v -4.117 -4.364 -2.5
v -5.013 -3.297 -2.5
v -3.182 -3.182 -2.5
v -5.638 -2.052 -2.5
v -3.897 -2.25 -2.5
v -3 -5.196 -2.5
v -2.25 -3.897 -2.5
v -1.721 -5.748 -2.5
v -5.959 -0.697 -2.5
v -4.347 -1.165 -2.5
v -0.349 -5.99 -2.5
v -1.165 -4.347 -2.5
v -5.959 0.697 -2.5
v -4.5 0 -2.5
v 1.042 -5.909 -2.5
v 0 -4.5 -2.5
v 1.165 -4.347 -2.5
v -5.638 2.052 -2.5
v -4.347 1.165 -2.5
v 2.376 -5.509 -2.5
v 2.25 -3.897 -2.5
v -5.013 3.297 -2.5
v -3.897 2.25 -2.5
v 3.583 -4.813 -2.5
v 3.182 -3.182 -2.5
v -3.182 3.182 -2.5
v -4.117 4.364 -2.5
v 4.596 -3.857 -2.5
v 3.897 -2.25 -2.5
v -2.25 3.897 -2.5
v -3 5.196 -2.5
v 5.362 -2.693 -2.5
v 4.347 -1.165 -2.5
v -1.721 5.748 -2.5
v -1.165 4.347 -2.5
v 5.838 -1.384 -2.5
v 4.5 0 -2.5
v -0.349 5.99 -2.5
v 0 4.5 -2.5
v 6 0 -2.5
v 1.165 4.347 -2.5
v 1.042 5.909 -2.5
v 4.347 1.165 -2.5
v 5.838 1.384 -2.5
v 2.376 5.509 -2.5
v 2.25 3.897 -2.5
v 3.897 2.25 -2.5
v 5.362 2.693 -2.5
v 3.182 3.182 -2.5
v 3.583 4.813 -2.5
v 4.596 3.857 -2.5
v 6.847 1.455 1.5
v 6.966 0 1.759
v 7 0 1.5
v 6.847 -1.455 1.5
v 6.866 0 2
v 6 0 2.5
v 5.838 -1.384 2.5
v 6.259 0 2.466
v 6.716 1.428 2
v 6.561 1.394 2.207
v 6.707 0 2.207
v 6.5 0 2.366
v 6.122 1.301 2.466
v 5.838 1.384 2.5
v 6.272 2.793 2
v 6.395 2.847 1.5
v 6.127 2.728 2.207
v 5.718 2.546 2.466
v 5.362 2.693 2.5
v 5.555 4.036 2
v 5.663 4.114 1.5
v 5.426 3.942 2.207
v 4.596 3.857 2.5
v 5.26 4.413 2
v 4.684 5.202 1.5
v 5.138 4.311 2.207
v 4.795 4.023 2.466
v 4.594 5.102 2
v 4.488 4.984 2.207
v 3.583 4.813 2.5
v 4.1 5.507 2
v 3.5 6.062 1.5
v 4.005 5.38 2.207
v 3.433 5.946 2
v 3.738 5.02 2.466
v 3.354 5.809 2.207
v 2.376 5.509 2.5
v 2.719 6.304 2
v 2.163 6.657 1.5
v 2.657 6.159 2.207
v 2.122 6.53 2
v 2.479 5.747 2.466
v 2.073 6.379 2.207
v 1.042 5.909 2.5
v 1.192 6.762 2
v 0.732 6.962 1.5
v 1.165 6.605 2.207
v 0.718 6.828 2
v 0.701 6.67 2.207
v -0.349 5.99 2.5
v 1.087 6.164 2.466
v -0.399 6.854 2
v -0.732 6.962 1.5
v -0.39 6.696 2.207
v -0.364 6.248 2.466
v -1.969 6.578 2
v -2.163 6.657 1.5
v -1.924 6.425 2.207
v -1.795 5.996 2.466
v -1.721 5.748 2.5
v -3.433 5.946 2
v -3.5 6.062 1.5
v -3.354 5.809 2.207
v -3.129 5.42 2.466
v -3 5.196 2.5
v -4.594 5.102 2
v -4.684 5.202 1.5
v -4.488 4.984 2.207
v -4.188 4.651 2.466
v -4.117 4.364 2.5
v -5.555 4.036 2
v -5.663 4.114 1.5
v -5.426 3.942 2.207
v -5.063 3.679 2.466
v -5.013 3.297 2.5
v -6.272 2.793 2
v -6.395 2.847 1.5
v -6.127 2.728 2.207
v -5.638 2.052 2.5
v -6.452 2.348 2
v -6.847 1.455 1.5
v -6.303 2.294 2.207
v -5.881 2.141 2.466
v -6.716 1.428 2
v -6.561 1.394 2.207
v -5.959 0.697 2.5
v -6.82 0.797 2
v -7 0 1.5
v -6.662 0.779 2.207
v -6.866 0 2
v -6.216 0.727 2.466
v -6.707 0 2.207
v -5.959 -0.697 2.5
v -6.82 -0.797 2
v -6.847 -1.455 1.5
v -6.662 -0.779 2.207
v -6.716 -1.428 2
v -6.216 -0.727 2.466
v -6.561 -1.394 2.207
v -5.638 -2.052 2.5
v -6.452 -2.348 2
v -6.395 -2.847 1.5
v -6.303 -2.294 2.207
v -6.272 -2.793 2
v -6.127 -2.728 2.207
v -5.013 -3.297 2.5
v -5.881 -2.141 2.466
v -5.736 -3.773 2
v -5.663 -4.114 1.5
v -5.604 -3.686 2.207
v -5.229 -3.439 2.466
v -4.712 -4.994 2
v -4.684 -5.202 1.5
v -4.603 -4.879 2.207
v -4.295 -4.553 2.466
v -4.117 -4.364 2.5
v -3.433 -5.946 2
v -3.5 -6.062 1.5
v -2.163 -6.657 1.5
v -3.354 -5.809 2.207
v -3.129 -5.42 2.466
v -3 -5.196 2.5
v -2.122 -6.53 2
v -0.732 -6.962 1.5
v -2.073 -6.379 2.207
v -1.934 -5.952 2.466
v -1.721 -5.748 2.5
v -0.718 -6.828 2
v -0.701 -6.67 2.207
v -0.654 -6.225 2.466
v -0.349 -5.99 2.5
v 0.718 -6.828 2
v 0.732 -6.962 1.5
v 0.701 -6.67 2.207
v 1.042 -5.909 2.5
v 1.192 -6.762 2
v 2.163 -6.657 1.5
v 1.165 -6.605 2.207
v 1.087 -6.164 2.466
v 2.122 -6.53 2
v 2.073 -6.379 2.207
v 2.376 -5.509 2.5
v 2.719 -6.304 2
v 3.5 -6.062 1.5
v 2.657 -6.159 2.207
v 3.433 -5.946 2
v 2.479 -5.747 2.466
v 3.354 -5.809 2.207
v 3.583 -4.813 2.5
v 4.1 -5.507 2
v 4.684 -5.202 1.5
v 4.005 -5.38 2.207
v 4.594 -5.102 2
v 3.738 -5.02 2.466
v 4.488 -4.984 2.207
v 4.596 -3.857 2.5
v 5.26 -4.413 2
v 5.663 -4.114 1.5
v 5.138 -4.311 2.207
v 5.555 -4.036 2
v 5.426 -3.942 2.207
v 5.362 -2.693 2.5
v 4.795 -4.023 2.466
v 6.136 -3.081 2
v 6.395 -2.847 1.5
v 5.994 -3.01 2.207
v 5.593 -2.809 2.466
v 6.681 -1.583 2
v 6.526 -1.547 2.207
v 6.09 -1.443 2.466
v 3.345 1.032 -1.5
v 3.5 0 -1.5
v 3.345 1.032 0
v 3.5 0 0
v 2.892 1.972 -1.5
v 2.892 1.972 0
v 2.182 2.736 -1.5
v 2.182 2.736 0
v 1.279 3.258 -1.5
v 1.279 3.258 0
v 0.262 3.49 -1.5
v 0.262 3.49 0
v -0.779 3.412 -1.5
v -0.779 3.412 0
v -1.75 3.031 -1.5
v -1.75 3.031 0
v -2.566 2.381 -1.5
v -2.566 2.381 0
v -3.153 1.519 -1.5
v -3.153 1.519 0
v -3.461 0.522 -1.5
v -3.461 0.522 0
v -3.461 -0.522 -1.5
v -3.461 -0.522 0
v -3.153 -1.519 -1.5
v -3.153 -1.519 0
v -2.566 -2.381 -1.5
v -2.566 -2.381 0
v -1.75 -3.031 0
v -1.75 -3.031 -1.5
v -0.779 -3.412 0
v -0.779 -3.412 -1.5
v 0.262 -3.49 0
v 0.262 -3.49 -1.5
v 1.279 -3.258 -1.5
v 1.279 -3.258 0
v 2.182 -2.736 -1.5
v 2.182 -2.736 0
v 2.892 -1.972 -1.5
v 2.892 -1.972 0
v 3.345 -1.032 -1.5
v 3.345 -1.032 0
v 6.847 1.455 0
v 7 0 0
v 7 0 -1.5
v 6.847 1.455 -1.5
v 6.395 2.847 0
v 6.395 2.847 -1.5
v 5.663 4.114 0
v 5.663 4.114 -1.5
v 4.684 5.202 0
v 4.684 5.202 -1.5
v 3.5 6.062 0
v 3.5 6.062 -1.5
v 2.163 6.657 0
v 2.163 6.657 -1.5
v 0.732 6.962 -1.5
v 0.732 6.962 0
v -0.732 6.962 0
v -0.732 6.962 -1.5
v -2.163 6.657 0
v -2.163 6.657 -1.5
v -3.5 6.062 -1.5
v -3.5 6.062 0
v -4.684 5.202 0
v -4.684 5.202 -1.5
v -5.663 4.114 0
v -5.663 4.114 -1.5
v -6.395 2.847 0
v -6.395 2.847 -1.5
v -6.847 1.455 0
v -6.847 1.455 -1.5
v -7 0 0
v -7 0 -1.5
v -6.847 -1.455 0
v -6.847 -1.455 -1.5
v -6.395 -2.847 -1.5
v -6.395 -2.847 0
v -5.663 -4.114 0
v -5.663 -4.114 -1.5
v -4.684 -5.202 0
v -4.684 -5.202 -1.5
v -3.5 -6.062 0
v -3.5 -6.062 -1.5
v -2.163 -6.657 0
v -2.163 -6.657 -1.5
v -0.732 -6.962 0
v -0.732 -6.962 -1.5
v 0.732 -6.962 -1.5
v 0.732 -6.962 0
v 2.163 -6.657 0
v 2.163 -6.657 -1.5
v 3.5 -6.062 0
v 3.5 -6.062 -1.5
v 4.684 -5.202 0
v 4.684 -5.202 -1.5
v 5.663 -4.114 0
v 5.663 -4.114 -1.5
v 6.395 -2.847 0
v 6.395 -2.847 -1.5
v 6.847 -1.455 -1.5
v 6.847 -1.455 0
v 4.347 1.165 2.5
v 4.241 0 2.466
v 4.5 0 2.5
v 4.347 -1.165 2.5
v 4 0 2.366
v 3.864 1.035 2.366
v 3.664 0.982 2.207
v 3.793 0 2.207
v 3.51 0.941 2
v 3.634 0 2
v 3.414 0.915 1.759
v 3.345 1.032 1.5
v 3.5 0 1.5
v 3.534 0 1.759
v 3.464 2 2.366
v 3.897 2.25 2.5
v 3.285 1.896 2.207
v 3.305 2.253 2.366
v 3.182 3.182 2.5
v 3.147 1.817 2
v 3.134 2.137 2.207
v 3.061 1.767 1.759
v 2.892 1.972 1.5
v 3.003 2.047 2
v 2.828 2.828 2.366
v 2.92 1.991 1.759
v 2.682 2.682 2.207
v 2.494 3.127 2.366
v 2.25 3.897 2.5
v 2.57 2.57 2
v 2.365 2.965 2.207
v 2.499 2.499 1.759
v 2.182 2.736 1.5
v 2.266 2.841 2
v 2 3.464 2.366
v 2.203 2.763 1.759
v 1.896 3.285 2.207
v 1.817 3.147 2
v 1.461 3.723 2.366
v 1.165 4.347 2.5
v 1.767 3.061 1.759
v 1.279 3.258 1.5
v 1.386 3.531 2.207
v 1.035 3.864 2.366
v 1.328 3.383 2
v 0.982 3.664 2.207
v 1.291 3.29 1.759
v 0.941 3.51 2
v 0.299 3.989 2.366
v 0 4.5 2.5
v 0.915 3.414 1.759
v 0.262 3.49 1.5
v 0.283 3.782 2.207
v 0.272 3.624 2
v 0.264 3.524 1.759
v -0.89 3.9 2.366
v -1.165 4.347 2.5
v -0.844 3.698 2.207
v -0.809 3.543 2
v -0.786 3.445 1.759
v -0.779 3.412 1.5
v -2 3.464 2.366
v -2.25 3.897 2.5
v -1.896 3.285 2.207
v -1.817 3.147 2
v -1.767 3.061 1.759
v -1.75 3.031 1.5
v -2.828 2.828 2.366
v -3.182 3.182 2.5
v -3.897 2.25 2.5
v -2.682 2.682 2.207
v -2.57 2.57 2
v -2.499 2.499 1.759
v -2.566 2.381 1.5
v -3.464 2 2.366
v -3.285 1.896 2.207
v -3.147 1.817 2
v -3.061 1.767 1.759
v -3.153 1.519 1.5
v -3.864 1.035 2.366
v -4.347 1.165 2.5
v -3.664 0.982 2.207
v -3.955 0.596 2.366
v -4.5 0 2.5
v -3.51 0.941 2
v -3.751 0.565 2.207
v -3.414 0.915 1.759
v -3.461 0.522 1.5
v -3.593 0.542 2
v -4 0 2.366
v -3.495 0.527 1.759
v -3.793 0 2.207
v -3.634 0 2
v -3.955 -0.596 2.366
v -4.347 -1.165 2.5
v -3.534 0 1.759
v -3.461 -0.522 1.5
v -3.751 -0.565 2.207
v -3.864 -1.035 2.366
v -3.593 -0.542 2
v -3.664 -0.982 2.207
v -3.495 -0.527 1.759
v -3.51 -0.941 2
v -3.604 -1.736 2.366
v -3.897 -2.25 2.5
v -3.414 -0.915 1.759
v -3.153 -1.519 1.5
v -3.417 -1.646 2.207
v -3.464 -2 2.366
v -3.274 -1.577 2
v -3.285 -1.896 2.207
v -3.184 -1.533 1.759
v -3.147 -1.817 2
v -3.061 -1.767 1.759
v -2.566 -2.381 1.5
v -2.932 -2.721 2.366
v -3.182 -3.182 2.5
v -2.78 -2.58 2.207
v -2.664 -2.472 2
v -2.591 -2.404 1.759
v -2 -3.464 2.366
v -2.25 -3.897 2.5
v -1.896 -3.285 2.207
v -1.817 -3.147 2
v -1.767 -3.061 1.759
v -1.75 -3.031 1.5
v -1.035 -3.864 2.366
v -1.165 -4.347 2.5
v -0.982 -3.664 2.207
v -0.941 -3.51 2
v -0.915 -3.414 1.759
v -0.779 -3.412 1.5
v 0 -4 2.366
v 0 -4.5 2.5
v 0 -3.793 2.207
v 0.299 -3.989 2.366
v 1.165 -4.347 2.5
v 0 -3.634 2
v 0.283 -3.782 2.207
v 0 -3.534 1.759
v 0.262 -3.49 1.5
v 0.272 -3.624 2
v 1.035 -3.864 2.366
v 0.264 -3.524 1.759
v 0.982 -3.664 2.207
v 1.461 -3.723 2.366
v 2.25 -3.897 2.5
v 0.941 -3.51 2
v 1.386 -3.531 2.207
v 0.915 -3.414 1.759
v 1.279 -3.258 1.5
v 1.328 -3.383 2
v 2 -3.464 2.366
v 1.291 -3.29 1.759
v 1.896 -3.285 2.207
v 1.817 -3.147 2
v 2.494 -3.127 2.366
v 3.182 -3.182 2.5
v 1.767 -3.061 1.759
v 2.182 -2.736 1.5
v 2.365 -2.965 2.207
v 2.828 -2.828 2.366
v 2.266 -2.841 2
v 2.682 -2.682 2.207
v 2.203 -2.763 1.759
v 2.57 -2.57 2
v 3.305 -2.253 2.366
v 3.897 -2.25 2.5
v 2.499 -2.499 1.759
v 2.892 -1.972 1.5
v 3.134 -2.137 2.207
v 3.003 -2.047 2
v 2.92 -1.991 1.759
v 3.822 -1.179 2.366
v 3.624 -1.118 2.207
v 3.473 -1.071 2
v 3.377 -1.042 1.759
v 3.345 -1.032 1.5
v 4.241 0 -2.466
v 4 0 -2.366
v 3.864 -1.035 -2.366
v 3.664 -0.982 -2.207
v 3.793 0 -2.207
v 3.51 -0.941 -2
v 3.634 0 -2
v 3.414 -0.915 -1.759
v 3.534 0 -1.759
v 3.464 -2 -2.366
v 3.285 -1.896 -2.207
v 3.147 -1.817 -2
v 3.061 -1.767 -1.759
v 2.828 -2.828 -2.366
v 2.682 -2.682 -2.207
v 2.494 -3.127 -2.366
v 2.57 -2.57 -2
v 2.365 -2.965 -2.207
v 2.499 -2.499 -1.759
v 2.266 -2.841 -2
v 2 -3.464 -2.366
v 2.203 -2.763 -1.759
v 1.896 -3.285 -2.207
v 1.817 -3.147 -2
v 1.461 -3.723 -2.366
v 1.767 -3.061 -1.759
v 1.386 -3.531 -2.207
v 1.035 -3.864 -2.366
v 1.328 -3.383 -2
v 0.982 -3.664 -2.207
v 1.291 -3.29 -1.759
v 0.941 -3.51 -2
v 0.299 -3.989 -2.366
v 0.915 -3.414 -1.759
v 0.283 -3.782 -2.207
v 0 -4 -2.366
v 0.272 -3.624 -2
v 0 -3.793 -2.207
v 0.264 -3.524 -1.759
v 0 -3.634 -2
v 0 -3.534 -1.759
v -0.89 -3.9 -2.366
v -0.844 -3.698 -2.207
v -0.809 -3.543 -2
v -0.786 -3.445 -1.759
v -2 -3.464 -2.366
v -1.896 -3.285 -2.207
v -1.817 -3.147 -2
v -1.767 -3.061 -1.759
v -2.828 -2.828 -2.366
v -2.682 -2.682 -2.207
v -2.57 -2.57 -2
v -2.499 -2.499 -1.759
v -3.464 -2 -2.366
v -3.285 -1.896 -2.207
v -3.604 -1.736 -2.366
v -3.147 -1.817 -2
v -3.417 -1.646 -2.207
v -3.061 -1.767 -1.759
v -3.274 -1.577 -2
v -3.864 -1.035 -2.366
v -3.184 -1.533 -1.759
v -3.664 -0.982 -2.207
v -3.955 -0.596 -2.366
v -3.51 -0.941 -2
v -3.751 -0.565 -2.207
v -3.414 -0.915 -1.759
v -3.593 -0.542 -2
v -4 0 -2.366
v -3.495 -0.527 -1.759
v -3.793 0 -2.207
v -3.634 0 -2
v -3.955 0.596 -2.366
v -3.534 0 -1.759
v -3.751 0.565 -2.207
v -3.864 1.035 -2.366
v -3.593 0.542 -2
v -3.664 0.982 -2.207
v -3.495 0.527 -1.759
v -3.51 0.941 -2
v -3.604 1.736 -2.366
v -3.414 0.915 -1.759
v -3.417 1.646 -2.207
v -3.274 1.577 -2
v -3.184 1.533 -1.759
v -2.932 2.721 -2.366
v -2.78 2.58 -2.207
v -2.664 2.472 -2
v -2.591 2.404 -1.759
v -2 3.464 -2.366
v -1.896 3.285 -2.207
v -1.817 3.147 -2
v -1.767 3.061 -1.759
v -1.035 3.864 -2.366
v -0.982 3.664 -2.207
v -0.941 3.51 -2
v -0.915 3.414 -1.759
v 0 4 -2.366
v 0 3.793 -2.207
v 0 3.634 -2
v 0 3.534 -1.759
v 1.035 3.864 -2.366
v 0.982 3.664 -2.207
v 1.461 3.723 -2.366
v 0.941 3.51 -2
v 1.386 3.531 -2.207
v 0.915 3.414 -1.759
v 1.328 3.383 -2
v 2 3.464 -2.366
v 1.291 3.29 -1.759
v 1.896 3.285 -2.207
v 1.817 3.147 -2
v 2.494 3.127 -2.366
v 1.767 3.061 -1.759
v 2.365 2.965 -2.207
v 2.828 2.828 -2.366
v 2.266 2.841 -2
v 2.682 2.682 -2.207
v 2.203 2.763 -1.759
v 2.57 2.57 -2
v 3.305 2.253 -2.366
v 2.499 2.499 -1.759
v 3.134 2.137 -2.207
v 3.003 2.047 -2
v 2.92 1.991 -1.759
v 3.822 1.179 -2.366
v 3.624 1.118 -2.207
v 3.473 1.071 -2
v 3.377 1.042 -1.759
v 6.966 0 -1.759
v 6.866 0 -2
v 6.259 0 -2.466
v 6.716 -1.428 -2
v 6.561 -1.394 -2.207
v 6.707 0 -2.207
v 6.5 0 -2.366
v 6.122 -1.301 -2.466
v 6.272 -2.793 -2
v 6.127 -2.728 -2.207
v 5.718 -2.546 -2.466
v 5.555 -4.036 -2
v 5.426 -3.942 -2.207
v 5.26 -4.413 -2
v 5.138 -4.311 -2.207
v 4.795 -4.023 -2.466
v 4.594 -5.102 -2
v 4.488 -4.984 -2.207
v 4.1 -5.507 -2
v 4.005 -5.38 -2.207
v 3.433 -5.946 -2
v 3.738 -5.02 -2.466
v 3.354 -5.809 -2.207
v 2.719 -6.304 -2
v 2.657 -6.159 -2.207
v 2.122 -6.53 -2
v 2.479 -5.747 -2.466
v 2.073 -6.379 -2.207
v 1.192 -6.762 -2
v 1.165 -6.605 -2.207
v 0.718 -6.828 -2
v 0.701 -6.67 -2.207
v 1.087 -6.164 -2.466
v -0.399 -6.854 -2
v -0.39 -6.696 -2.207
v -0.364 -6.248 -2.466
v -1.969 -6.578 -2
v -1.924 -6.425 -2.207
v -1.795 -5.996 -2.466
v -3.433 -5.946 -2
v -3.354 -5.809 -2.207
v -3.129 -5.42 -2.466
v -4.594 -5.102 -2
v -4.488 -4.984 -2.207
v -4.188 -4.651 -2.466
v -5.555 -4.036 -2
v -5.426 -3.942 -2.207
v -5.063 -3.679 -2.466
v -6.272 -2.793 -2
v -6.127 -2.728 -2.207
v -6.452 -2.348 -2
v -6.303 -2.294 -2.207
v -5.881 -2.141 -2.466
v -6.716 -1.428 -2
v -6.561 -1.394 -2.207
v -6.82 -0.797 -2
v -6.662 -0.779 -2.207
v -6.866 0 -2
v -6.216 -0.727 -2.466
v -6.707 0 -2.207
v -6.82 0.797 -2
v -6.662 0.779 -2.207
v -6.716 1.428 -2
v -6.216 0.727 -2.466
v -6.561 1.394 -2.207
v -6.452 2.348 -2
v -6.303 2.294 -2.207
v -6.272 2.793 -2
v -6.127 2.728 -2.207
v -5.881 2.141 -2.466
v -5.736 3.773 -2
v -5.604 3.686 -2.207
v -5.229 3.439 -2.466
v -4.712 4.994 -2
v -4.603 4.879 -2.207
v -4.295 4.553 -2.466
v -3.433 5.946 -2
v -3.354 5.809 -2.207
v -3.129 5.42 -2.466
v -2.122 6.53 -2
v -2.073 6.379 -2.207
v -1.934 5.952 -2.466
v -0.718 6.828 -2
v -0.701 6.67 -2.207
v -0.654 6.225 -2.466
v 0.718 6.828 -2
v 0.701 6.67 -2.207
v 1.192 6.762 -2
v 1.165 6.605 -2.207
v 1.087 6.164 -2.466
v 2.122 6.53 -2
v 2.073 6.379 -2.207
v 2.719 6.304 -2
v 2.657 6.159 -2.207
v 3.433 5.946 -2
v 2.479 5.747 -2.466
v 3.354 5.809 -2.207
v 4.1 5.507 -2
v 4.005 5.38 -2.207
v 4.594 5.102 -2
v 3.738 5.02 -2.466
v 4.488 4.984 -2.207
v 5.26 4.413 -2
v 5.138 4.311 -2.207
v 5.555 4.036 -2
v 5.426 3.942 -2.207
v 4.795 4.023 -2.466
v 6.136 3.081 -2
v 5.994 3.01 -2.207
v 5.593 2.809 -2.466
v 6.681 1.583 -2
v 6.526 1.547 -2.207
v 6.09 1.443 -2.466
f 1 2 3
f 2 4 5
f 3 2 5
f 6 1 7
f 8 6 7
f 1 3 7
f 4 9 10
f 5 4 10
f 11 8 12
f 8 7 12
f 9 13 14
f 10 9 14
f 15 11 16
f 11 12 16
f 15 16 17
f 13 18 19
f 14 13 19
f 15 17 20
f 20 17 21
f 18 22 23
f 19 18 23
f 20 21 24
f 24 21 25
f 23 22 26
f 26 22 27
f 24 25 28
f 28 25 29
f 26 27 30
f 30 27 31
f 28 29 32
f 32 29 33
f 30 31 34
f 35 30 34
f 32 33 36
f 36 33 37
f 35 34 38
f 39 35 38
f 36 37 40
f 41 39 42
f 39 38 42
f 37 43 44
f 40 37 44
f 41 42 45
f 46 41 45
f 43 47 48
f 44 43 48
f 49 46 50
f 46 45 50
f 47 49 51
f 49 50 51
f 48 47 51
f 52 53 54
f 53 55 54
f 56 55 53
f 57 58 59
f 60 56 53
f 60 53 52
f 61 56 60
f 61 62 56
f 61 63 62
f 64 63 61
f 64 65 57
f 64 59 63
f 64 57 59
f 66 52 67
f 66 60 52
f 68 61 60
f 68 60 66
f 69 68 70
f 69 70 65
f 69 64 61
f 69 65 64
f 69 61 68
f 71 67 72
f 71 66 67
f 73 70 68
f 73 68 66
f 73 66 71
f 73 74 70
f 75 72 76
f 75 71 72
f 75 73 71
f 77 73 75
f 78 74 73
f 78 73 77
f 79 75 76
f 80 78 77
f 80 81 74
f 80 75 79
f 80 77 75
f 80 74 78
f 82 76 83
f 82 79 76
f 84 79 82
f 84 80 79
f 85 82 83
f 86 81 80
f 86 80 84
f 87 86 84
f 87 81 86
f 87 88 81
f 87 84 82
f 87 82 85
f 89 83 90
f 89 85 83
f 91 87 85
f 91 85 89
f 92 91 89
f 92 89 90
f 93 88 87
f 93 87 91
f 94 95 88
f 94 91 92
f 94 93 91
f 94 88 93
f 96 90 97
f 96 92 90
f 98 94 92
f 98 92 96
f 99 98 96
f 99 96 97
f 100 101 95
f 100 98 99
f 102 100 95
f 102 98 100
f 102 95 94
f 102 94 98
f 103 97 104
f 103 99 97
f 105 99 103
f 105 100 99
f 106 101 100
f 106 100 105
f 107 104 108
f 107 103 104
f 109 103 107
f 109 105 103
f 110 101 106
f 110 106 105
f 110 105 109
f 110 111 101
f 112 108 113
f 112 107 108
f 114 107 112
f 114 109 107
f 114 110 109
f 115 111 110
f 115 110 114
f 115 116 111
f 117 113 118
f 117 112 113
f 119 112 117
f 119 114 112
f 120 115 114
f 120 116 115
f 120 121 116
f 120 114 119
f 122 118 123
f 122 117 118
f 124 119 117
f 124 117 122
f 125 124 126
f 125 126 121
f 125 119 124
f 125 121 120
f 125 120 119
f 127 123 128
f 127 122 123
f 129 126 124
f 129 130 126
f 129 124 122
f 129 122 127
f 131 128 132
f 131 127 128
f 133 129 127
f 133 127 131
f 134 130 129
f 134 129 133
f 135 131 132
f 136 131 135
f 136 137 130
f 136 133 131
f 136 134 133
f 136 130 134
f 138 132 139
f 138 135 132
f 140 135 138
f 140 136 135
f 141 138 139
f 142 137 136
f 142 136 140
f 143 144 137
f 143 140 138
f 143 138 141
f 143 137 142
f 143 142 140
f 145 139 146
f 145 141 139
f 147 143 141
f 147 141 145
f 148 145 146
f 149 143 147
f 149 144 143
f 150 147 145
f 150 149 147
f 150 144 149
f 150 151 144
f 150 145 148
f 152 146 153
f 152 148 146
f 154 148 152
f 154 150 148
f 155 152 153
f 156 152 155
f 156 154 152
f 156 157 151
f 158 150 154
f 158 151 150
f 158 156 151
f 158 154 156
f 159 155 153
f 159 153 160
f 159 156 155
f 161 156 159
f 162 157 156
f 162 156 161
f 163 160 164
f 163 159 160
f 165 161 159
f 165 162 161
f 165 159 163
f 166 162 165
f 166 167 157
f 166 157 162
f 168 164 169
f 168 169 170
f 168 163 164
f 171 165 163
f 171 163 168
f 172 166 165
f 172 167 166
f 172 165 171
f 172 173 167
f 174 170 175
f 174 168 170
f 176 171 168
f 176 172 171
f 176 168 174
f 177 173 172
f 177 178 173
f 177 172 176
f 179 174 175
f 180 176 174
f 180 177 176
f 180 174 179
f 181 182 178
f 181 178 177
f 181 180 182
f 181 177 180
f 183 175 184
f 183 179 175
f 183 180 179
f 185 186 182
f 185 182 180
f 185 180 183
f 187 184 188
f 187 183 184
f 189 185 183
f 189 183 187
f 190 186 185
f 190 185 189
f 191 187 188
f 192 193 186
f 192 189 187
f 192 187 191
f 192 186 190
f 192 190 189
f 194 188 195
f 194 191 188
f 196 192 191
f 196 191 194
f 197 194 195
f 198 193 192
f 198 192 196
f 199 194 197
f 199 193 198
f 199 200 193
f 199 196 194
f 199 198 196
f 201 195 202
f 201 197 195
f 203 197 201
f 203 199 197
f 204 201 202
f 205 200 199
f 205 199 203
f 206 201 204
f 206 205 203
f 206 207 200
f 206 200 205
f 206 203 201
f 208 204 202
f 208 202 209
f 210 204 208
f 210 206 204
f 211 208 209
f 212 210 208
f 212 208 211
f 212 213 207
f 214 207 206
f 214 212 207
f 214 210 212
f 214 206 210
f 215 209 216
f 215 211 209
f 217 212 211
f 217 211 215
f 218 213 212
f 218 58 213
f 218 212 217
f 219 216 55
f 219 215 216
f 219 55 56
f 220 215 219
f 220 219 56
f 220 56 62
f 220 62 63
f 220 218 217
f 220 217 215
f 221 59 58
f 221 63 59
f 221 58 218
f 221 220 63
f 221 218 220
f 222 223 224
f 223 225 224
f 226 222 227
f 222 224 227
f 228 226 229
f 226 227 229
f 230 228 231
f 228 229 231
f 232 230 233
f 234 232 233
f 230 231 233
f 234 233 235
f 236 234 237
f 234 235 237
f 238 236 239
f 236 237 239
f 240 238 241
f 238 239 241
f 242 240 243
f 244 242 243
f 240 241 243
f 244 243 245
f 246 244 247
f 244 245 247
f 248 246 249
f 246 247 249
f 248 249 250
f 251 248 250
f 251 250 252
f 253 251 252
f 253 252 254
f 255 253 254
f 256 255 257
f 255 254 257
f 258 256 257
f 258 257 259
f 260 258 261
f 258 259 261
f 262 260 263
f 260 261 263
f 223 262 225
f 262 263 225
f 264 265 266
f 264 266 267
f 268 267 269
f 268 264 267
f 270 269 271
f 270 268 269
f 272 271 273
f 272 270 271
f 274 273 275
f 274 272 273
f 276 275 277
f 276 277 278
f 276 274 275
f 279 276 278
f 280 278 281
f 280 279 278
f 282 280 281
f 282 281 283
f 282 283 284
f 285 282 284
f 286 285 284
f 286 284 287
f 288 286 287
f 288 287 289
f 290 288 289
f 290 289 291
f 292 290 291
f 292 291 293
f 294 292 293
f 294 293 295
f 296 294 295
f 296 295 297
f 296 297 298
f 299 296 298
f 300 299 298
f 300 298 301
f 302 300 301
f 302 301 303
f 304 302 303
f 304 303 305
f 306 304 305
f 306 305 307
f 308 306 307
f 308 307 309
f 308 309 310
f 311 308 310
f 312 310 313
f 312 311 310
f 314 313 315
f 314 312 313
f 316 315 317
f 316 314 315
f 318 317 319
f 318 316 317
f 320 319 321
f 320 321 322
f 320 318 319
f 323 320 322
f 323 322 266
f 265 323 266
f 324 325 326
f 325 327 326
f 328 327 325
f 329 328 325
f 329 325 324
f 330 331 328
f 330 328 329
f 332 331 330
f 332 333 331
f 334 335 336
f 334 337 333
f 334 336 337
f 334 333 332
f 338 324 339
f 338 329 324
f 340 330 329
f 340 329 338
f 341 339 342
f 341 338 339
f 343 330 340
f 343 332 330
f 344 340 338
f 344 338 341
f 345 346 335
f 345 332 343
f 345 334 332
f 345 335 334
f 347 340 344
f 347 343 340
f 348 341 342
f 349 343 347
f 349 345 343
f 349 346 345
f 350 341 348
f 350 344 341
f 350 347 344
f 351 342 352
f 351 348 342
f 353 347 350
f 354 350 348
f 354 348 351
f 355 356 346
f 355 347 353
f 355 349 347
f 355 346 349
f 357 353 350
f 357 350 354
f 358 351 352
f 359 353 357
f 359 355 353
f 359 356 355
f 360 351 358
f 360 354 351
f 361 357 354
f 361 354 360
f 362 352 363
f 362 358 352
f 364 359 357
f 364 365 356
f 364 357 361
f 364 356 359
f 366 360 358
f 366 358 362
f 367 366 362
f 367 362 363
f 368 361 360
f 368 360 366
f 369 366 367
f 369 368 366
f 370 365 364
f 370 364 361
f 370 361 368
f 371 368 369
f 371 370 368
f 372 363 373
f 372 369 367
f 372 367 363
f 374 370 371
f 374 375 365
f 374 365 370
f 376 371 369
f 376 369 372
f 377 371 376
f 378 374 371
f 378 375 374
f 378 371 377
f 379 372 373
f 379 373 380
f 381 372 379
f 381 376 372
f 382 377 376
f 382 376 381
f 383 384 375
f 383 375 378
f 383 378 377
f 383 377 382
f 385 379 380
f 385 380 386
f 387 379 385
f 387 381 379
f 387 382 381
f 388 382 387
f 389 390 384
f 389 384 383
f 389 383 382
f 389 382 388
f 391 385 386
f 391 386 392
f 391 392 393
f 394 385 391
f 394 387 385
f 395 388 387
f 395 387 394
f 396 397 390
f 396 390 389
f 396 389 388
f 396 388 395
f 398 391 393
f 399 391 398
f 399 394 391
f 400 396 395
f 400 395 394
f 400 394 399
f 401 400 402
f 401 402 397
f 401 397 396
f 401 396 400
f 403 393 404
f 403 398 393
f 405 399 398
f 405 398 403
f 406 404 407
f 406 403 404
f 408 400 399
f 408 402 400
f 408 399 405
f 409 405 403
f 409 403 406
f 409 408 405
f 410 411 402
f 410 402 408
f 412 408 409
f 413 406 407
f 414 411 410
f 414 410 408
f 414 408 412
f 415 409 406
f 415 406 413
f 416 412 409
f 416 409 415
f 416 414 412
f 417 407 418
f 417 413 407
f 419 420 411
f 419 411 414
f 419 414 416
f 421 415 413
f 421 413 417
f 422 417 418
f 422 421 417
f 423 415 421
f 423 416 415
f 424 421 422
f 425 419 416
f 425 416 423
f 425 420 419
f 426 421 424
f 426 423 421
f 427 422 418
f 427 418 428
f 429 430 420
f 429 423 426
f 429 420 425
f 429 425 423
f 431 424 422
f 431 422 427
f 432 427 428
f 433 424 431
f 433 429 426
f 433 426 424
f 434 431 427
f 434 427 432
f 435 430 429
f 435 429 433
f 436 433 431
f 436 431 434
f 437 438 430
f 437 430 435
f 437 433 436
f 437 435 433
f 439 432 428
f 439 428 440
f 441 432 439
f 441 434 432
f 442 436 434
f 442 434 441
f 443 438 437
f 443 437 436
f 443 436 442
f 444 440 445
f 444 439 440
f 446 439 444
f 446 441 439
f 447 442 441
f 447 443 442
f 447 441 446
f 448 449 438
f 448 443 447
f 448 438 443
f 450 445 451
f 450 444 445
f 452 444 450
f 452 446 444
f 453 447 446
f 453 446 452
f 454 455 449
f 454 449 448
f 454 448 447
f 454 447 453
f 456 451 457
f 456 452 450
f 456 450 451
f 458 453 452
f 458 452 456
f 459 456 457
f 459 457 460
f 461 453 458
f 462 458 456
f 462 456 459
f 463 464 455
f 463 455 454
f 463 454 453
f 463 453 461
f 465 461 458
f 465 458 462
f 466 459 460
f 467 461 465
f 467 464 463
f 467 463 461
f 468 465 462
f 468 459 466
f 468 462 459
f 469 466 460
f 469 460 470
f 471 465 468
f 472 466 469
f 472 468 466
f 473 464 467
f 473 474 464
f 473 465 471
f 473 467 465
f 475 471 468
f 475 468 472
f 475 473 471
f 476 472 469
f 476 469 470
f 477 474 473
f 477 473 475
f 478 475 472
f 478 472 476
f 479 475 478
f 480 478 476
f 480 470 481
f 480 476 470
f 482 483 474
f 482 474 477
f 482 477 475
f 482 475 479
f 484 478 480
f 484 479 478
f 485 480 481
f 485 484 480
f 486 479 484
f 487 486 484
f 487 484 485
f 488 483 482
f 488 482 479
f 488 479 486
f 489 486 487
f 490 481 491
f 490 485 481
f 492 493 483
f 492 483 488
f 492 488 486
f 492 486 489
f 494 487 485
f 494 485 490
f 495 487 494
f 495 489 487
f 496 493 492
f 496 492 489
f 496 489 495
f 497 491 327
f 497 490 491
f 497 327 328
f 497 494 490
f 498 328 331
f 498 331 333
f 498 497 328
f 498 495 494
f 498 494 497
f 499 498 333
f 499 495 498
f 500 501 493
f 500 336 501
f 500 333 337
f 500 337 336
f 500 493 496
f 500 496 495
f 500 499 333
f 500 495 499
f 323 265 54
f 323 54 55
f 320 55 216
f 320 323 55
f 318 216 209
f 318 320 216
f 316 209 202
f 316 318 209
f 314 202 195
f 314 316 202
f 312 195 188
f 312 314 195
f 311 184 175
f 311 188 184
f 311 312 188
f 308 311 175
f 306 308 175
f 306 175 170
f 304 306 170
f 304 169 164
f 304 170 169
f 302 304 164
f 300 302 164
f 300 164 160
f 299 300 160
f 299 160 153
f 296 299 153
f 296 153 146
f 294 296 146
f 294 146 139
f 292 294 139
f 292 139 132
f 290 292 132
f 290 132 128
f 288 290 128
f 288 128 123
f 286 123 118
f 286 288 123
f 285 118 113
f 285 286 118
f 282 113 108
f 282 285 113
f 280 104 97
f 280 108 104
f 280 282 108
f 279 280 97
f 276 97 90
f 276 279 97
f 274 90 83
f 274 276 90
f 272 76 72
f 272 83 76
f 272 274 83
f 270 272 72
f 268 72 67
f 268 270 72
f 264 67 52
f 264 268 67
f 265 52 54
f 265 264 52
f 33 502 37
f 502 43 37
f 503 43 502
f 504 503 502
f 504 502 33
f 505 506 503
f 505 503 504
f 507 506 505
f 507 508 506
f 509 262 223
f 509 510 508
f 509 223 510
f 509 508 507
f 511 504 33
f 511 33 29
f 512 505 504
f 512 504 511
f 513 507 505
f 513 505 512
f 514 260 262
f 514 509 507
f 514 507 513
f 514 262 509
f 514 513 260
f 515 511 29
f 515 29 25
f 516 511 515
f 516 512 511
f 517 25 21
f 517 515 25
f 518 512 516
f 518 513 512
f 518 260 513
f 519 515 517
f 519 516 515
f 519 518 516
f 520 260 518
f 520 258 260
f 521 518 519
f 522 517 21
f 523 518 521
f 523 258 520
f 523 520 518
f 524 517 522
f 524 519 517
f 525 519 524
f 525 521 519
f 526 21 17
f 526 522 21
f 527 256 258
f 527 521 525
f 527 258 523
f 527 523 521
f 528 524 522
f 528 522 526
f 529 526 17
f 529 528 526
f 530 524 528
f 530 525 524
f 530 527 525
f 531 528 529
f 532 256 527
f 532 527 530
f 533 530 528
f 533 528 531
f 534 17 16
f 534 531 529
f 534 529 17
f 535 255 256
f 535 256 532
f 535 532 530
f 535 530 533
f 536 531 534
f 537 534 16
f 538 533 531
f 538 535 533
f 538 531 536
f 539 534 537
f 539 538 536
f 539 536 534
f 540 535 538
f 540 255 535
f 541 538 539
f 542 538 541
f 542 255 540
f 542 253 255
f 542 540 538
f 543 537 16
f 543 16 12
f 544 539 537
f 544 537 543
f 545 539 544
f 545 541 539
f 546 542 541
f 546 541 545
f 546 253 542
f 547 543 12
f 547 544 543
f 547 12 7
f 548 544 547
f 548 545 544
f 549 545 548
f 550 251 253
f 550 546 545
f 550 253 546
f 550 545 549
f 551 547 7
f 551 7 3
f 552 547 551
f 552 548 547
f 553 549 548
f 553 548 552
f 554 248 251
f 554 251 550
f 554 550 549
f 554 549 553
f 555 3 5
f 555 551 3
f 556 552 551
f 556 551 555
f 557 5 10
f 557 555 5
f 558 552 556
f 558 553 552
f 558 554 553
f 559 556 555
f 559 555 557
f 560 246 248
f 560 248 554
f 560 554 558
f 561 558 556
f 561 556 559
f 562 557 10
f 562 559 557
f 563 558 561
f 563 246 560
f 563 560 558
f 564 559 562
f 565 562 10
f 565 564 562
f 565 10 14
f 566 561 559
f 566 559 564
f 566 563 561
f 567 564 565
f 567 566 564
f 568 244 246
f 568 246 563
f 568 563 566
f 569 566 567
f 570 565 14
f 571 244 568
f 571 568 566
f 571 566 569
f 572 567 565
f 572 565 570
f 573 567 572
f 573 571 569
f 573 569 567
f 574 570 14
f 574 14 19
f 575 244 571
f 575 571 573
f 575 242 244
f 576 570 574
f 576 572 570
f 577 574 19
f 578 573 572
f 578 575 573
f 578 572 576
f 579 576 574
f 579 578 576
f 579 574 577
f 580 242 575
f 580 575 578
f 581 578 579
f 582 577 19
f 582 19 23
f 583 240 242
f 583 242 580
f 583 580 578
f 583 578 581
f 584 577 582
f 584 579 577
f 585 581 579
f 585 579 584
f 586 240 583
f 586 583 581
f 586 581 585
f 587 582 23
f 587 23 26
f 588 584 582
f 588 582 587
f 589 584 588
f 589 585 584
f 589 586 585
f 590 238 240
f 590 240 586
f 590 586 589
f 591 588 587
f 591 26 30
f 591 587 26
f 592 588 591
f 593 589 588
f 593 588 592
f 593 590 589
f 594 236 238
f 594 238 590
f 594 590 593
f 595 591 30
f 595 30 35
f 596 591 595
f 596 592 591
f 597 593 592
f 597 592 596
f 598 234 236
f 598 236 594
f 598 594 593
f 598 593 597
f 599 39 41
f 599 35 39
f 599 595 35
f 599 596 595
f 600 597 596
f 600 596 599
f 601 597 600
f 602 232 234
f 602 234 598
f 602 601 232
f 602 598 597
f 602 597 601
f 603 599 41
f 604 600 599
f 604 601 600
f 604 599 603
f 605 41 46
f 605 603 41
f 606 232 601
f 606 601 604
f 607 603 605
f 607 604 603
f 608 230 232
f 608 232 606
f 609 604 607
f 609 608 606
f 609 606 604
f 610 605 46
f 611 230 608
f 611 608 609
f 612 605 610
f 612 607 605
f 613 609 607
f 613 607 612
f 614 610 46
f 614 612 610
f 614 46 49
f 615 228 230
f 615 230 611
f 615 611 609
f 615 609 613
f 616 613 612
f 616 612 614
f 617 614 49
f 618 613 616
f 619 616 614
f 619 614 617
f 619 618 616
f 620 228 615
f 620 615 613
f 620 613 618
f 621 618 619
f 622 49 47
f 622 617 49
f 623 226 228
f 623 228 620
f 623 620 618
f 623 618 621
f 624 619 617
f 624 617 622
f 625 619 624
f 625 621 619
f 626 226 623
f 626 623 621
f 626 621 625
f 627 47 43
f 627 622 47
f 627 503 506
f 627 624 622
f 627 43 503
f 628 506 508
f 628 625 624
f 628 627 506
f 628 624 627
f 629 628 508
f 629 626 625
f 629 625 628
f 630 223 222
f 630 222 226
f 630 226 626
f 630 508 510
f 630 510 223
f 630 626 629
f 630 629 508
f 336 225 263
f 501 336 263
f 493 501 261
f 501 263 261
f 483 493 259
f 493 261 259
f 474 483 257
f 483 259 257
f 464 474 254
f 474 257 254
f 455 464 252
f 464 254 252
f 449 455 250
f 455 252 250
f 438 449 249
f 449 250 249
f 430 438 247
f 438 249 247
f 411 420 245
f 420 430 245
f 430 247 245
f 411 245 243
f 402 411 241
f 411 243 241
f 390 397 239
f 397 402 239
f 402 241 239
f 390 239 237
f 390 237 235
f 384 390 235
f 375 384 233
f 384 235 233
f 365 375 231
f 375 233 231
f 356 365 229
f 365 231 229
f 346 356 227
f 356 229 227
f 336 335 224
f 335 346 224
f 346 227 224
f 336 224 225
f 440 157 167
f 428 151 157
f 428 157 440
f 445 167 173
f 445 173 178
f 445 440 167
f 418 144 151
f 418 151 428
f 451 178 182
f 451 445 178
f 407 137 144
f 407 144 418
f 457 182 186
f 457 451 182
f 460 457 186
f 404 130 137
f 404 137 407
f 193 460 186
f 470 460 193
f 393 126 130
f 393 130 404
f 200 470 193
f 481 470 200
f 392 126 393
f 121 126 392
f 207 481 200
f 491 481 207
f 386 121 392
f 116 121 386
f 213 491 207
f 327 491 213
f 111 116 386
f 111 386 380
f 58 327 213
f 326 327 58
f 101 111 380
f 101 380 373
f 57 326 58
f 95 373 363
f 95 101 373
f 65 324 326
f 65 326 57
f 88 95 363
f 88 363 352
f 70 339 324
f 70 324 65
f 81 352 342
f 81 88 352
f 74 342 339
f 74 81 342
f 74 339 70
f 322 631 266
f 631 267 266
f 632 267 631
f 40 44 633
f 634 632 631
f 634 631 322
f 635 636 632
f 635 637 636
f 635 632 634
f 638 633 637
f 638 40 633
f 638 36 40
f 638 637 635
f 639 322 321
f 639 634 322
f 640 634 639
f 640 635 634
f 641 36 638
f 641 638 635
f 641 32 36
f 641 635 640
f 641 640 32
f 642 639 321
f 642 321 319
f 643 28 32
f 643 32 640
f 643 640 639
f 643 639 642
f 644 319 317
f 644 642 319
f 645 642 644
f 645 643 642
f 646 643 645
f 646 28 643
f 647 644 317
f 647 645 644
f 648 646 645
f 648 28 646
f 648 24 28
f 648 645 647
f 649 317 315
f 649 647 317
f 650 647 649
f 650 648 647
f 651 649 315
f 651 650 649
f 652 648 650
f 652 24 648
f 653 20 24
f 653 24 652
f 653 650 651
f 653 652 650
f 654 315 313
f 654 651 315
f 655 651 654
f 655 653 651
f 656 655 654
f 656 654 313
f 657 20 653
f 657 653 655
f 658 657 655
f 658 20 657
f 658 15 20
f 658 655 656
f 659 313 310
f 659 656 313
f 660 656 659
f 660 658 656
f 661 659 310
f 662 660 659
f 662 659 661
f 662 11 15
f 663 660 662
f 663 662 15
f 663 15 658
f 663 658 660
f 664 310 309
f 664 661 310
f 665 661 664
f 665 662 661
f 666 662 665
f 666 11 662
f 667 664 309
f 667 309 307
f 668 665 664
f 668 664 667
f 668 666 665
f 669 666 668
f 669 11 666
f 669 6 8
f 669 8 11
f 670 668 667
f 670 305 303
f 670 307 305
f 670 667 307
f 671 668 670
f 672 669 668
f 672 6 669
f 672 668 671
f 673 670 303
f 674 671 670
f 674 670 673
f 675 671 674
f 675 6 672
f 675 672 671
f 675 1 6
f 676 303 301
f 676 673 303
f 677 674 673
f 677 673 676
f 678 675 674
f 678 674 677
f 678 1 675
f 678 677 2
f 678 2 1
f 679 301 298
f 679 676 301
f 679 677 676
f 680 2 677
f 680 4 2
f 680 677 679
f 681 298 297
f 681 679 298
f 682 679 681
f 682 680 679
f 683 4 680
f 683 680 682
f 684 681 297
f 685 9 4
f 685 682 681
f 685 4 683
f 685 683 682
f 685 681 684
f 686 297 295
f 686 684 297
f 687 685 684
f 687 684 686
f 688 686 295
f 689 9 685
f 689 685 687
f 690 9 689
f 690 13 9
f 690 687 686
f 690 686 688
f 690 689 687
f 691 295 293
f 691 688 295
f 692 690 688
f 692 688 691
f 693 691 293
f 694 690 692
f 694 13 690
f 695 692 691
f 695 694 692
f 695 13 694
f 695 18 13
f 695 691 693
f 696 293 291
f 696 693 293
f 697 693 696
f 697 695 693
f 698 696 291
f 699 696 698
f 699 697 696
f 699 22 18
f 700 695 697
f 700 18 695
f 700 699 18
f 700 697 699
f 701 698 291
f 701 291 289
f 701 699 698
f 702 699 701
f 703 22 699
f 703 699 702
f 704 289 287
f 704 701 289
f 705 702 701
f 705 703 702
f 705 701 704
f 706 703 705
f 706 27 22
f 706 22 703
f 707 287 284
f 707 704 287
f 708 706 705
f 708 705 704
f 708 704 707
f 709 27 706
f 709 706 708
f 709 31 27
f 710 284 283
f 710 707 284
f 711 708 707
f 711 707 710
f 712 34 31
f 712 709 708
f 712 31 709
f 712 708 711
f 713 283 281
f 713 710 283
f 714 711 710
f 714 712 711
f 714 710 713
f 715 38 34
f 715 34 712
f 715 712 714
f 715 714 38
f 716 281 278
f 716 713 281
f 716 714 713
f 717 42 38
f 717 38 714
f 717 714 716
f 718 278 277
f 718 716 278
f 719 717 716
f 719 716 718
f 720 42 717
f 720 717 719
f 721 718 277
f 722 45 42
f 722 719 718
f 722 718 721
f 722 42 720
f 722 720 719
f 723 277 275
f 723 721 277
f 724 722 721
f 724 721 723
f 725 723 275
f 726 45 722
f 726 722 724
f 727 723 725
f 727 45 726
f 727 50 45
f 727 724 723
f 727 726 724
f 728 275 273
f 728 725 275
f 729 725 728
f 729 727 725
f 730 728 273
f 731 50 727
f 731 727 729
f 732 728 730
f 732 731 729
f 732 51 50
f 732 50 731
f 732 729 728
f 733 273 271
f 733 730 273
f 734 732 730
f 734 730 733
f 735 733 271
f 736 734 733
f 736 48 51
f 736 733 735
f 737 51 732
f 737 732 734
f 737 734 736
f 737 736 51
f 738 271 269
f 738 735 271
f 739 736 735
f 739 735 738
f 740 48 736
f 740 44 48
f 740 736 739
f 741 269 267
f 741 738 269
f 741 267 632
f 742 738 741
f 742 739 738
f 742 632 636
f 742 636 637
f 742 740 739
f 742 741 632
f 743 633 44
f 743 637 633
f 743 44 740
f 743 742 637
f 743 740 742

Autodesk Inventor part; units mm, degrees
sketch "Skizze1" plane through (0, 0, 0) normal (0, 0, 1) x (1, 0, 0)
  circle A0 centre (0, 0) radius 7
  circle A1 centre (0, 0) radius 3.5
  dimension "d0" = 14
  dimension "d1" = 7
extrude "Extrusion1" add sketch "Skizze1" along normal mid plane 5
fillet "Rundung1" radius 1 4 edges at (-7, 0, 2.5) (-7, 0, -2.5) (-3.5, 0, 2.5) (-3.5, 0, -2.5)
properties part number "KugelLager"
